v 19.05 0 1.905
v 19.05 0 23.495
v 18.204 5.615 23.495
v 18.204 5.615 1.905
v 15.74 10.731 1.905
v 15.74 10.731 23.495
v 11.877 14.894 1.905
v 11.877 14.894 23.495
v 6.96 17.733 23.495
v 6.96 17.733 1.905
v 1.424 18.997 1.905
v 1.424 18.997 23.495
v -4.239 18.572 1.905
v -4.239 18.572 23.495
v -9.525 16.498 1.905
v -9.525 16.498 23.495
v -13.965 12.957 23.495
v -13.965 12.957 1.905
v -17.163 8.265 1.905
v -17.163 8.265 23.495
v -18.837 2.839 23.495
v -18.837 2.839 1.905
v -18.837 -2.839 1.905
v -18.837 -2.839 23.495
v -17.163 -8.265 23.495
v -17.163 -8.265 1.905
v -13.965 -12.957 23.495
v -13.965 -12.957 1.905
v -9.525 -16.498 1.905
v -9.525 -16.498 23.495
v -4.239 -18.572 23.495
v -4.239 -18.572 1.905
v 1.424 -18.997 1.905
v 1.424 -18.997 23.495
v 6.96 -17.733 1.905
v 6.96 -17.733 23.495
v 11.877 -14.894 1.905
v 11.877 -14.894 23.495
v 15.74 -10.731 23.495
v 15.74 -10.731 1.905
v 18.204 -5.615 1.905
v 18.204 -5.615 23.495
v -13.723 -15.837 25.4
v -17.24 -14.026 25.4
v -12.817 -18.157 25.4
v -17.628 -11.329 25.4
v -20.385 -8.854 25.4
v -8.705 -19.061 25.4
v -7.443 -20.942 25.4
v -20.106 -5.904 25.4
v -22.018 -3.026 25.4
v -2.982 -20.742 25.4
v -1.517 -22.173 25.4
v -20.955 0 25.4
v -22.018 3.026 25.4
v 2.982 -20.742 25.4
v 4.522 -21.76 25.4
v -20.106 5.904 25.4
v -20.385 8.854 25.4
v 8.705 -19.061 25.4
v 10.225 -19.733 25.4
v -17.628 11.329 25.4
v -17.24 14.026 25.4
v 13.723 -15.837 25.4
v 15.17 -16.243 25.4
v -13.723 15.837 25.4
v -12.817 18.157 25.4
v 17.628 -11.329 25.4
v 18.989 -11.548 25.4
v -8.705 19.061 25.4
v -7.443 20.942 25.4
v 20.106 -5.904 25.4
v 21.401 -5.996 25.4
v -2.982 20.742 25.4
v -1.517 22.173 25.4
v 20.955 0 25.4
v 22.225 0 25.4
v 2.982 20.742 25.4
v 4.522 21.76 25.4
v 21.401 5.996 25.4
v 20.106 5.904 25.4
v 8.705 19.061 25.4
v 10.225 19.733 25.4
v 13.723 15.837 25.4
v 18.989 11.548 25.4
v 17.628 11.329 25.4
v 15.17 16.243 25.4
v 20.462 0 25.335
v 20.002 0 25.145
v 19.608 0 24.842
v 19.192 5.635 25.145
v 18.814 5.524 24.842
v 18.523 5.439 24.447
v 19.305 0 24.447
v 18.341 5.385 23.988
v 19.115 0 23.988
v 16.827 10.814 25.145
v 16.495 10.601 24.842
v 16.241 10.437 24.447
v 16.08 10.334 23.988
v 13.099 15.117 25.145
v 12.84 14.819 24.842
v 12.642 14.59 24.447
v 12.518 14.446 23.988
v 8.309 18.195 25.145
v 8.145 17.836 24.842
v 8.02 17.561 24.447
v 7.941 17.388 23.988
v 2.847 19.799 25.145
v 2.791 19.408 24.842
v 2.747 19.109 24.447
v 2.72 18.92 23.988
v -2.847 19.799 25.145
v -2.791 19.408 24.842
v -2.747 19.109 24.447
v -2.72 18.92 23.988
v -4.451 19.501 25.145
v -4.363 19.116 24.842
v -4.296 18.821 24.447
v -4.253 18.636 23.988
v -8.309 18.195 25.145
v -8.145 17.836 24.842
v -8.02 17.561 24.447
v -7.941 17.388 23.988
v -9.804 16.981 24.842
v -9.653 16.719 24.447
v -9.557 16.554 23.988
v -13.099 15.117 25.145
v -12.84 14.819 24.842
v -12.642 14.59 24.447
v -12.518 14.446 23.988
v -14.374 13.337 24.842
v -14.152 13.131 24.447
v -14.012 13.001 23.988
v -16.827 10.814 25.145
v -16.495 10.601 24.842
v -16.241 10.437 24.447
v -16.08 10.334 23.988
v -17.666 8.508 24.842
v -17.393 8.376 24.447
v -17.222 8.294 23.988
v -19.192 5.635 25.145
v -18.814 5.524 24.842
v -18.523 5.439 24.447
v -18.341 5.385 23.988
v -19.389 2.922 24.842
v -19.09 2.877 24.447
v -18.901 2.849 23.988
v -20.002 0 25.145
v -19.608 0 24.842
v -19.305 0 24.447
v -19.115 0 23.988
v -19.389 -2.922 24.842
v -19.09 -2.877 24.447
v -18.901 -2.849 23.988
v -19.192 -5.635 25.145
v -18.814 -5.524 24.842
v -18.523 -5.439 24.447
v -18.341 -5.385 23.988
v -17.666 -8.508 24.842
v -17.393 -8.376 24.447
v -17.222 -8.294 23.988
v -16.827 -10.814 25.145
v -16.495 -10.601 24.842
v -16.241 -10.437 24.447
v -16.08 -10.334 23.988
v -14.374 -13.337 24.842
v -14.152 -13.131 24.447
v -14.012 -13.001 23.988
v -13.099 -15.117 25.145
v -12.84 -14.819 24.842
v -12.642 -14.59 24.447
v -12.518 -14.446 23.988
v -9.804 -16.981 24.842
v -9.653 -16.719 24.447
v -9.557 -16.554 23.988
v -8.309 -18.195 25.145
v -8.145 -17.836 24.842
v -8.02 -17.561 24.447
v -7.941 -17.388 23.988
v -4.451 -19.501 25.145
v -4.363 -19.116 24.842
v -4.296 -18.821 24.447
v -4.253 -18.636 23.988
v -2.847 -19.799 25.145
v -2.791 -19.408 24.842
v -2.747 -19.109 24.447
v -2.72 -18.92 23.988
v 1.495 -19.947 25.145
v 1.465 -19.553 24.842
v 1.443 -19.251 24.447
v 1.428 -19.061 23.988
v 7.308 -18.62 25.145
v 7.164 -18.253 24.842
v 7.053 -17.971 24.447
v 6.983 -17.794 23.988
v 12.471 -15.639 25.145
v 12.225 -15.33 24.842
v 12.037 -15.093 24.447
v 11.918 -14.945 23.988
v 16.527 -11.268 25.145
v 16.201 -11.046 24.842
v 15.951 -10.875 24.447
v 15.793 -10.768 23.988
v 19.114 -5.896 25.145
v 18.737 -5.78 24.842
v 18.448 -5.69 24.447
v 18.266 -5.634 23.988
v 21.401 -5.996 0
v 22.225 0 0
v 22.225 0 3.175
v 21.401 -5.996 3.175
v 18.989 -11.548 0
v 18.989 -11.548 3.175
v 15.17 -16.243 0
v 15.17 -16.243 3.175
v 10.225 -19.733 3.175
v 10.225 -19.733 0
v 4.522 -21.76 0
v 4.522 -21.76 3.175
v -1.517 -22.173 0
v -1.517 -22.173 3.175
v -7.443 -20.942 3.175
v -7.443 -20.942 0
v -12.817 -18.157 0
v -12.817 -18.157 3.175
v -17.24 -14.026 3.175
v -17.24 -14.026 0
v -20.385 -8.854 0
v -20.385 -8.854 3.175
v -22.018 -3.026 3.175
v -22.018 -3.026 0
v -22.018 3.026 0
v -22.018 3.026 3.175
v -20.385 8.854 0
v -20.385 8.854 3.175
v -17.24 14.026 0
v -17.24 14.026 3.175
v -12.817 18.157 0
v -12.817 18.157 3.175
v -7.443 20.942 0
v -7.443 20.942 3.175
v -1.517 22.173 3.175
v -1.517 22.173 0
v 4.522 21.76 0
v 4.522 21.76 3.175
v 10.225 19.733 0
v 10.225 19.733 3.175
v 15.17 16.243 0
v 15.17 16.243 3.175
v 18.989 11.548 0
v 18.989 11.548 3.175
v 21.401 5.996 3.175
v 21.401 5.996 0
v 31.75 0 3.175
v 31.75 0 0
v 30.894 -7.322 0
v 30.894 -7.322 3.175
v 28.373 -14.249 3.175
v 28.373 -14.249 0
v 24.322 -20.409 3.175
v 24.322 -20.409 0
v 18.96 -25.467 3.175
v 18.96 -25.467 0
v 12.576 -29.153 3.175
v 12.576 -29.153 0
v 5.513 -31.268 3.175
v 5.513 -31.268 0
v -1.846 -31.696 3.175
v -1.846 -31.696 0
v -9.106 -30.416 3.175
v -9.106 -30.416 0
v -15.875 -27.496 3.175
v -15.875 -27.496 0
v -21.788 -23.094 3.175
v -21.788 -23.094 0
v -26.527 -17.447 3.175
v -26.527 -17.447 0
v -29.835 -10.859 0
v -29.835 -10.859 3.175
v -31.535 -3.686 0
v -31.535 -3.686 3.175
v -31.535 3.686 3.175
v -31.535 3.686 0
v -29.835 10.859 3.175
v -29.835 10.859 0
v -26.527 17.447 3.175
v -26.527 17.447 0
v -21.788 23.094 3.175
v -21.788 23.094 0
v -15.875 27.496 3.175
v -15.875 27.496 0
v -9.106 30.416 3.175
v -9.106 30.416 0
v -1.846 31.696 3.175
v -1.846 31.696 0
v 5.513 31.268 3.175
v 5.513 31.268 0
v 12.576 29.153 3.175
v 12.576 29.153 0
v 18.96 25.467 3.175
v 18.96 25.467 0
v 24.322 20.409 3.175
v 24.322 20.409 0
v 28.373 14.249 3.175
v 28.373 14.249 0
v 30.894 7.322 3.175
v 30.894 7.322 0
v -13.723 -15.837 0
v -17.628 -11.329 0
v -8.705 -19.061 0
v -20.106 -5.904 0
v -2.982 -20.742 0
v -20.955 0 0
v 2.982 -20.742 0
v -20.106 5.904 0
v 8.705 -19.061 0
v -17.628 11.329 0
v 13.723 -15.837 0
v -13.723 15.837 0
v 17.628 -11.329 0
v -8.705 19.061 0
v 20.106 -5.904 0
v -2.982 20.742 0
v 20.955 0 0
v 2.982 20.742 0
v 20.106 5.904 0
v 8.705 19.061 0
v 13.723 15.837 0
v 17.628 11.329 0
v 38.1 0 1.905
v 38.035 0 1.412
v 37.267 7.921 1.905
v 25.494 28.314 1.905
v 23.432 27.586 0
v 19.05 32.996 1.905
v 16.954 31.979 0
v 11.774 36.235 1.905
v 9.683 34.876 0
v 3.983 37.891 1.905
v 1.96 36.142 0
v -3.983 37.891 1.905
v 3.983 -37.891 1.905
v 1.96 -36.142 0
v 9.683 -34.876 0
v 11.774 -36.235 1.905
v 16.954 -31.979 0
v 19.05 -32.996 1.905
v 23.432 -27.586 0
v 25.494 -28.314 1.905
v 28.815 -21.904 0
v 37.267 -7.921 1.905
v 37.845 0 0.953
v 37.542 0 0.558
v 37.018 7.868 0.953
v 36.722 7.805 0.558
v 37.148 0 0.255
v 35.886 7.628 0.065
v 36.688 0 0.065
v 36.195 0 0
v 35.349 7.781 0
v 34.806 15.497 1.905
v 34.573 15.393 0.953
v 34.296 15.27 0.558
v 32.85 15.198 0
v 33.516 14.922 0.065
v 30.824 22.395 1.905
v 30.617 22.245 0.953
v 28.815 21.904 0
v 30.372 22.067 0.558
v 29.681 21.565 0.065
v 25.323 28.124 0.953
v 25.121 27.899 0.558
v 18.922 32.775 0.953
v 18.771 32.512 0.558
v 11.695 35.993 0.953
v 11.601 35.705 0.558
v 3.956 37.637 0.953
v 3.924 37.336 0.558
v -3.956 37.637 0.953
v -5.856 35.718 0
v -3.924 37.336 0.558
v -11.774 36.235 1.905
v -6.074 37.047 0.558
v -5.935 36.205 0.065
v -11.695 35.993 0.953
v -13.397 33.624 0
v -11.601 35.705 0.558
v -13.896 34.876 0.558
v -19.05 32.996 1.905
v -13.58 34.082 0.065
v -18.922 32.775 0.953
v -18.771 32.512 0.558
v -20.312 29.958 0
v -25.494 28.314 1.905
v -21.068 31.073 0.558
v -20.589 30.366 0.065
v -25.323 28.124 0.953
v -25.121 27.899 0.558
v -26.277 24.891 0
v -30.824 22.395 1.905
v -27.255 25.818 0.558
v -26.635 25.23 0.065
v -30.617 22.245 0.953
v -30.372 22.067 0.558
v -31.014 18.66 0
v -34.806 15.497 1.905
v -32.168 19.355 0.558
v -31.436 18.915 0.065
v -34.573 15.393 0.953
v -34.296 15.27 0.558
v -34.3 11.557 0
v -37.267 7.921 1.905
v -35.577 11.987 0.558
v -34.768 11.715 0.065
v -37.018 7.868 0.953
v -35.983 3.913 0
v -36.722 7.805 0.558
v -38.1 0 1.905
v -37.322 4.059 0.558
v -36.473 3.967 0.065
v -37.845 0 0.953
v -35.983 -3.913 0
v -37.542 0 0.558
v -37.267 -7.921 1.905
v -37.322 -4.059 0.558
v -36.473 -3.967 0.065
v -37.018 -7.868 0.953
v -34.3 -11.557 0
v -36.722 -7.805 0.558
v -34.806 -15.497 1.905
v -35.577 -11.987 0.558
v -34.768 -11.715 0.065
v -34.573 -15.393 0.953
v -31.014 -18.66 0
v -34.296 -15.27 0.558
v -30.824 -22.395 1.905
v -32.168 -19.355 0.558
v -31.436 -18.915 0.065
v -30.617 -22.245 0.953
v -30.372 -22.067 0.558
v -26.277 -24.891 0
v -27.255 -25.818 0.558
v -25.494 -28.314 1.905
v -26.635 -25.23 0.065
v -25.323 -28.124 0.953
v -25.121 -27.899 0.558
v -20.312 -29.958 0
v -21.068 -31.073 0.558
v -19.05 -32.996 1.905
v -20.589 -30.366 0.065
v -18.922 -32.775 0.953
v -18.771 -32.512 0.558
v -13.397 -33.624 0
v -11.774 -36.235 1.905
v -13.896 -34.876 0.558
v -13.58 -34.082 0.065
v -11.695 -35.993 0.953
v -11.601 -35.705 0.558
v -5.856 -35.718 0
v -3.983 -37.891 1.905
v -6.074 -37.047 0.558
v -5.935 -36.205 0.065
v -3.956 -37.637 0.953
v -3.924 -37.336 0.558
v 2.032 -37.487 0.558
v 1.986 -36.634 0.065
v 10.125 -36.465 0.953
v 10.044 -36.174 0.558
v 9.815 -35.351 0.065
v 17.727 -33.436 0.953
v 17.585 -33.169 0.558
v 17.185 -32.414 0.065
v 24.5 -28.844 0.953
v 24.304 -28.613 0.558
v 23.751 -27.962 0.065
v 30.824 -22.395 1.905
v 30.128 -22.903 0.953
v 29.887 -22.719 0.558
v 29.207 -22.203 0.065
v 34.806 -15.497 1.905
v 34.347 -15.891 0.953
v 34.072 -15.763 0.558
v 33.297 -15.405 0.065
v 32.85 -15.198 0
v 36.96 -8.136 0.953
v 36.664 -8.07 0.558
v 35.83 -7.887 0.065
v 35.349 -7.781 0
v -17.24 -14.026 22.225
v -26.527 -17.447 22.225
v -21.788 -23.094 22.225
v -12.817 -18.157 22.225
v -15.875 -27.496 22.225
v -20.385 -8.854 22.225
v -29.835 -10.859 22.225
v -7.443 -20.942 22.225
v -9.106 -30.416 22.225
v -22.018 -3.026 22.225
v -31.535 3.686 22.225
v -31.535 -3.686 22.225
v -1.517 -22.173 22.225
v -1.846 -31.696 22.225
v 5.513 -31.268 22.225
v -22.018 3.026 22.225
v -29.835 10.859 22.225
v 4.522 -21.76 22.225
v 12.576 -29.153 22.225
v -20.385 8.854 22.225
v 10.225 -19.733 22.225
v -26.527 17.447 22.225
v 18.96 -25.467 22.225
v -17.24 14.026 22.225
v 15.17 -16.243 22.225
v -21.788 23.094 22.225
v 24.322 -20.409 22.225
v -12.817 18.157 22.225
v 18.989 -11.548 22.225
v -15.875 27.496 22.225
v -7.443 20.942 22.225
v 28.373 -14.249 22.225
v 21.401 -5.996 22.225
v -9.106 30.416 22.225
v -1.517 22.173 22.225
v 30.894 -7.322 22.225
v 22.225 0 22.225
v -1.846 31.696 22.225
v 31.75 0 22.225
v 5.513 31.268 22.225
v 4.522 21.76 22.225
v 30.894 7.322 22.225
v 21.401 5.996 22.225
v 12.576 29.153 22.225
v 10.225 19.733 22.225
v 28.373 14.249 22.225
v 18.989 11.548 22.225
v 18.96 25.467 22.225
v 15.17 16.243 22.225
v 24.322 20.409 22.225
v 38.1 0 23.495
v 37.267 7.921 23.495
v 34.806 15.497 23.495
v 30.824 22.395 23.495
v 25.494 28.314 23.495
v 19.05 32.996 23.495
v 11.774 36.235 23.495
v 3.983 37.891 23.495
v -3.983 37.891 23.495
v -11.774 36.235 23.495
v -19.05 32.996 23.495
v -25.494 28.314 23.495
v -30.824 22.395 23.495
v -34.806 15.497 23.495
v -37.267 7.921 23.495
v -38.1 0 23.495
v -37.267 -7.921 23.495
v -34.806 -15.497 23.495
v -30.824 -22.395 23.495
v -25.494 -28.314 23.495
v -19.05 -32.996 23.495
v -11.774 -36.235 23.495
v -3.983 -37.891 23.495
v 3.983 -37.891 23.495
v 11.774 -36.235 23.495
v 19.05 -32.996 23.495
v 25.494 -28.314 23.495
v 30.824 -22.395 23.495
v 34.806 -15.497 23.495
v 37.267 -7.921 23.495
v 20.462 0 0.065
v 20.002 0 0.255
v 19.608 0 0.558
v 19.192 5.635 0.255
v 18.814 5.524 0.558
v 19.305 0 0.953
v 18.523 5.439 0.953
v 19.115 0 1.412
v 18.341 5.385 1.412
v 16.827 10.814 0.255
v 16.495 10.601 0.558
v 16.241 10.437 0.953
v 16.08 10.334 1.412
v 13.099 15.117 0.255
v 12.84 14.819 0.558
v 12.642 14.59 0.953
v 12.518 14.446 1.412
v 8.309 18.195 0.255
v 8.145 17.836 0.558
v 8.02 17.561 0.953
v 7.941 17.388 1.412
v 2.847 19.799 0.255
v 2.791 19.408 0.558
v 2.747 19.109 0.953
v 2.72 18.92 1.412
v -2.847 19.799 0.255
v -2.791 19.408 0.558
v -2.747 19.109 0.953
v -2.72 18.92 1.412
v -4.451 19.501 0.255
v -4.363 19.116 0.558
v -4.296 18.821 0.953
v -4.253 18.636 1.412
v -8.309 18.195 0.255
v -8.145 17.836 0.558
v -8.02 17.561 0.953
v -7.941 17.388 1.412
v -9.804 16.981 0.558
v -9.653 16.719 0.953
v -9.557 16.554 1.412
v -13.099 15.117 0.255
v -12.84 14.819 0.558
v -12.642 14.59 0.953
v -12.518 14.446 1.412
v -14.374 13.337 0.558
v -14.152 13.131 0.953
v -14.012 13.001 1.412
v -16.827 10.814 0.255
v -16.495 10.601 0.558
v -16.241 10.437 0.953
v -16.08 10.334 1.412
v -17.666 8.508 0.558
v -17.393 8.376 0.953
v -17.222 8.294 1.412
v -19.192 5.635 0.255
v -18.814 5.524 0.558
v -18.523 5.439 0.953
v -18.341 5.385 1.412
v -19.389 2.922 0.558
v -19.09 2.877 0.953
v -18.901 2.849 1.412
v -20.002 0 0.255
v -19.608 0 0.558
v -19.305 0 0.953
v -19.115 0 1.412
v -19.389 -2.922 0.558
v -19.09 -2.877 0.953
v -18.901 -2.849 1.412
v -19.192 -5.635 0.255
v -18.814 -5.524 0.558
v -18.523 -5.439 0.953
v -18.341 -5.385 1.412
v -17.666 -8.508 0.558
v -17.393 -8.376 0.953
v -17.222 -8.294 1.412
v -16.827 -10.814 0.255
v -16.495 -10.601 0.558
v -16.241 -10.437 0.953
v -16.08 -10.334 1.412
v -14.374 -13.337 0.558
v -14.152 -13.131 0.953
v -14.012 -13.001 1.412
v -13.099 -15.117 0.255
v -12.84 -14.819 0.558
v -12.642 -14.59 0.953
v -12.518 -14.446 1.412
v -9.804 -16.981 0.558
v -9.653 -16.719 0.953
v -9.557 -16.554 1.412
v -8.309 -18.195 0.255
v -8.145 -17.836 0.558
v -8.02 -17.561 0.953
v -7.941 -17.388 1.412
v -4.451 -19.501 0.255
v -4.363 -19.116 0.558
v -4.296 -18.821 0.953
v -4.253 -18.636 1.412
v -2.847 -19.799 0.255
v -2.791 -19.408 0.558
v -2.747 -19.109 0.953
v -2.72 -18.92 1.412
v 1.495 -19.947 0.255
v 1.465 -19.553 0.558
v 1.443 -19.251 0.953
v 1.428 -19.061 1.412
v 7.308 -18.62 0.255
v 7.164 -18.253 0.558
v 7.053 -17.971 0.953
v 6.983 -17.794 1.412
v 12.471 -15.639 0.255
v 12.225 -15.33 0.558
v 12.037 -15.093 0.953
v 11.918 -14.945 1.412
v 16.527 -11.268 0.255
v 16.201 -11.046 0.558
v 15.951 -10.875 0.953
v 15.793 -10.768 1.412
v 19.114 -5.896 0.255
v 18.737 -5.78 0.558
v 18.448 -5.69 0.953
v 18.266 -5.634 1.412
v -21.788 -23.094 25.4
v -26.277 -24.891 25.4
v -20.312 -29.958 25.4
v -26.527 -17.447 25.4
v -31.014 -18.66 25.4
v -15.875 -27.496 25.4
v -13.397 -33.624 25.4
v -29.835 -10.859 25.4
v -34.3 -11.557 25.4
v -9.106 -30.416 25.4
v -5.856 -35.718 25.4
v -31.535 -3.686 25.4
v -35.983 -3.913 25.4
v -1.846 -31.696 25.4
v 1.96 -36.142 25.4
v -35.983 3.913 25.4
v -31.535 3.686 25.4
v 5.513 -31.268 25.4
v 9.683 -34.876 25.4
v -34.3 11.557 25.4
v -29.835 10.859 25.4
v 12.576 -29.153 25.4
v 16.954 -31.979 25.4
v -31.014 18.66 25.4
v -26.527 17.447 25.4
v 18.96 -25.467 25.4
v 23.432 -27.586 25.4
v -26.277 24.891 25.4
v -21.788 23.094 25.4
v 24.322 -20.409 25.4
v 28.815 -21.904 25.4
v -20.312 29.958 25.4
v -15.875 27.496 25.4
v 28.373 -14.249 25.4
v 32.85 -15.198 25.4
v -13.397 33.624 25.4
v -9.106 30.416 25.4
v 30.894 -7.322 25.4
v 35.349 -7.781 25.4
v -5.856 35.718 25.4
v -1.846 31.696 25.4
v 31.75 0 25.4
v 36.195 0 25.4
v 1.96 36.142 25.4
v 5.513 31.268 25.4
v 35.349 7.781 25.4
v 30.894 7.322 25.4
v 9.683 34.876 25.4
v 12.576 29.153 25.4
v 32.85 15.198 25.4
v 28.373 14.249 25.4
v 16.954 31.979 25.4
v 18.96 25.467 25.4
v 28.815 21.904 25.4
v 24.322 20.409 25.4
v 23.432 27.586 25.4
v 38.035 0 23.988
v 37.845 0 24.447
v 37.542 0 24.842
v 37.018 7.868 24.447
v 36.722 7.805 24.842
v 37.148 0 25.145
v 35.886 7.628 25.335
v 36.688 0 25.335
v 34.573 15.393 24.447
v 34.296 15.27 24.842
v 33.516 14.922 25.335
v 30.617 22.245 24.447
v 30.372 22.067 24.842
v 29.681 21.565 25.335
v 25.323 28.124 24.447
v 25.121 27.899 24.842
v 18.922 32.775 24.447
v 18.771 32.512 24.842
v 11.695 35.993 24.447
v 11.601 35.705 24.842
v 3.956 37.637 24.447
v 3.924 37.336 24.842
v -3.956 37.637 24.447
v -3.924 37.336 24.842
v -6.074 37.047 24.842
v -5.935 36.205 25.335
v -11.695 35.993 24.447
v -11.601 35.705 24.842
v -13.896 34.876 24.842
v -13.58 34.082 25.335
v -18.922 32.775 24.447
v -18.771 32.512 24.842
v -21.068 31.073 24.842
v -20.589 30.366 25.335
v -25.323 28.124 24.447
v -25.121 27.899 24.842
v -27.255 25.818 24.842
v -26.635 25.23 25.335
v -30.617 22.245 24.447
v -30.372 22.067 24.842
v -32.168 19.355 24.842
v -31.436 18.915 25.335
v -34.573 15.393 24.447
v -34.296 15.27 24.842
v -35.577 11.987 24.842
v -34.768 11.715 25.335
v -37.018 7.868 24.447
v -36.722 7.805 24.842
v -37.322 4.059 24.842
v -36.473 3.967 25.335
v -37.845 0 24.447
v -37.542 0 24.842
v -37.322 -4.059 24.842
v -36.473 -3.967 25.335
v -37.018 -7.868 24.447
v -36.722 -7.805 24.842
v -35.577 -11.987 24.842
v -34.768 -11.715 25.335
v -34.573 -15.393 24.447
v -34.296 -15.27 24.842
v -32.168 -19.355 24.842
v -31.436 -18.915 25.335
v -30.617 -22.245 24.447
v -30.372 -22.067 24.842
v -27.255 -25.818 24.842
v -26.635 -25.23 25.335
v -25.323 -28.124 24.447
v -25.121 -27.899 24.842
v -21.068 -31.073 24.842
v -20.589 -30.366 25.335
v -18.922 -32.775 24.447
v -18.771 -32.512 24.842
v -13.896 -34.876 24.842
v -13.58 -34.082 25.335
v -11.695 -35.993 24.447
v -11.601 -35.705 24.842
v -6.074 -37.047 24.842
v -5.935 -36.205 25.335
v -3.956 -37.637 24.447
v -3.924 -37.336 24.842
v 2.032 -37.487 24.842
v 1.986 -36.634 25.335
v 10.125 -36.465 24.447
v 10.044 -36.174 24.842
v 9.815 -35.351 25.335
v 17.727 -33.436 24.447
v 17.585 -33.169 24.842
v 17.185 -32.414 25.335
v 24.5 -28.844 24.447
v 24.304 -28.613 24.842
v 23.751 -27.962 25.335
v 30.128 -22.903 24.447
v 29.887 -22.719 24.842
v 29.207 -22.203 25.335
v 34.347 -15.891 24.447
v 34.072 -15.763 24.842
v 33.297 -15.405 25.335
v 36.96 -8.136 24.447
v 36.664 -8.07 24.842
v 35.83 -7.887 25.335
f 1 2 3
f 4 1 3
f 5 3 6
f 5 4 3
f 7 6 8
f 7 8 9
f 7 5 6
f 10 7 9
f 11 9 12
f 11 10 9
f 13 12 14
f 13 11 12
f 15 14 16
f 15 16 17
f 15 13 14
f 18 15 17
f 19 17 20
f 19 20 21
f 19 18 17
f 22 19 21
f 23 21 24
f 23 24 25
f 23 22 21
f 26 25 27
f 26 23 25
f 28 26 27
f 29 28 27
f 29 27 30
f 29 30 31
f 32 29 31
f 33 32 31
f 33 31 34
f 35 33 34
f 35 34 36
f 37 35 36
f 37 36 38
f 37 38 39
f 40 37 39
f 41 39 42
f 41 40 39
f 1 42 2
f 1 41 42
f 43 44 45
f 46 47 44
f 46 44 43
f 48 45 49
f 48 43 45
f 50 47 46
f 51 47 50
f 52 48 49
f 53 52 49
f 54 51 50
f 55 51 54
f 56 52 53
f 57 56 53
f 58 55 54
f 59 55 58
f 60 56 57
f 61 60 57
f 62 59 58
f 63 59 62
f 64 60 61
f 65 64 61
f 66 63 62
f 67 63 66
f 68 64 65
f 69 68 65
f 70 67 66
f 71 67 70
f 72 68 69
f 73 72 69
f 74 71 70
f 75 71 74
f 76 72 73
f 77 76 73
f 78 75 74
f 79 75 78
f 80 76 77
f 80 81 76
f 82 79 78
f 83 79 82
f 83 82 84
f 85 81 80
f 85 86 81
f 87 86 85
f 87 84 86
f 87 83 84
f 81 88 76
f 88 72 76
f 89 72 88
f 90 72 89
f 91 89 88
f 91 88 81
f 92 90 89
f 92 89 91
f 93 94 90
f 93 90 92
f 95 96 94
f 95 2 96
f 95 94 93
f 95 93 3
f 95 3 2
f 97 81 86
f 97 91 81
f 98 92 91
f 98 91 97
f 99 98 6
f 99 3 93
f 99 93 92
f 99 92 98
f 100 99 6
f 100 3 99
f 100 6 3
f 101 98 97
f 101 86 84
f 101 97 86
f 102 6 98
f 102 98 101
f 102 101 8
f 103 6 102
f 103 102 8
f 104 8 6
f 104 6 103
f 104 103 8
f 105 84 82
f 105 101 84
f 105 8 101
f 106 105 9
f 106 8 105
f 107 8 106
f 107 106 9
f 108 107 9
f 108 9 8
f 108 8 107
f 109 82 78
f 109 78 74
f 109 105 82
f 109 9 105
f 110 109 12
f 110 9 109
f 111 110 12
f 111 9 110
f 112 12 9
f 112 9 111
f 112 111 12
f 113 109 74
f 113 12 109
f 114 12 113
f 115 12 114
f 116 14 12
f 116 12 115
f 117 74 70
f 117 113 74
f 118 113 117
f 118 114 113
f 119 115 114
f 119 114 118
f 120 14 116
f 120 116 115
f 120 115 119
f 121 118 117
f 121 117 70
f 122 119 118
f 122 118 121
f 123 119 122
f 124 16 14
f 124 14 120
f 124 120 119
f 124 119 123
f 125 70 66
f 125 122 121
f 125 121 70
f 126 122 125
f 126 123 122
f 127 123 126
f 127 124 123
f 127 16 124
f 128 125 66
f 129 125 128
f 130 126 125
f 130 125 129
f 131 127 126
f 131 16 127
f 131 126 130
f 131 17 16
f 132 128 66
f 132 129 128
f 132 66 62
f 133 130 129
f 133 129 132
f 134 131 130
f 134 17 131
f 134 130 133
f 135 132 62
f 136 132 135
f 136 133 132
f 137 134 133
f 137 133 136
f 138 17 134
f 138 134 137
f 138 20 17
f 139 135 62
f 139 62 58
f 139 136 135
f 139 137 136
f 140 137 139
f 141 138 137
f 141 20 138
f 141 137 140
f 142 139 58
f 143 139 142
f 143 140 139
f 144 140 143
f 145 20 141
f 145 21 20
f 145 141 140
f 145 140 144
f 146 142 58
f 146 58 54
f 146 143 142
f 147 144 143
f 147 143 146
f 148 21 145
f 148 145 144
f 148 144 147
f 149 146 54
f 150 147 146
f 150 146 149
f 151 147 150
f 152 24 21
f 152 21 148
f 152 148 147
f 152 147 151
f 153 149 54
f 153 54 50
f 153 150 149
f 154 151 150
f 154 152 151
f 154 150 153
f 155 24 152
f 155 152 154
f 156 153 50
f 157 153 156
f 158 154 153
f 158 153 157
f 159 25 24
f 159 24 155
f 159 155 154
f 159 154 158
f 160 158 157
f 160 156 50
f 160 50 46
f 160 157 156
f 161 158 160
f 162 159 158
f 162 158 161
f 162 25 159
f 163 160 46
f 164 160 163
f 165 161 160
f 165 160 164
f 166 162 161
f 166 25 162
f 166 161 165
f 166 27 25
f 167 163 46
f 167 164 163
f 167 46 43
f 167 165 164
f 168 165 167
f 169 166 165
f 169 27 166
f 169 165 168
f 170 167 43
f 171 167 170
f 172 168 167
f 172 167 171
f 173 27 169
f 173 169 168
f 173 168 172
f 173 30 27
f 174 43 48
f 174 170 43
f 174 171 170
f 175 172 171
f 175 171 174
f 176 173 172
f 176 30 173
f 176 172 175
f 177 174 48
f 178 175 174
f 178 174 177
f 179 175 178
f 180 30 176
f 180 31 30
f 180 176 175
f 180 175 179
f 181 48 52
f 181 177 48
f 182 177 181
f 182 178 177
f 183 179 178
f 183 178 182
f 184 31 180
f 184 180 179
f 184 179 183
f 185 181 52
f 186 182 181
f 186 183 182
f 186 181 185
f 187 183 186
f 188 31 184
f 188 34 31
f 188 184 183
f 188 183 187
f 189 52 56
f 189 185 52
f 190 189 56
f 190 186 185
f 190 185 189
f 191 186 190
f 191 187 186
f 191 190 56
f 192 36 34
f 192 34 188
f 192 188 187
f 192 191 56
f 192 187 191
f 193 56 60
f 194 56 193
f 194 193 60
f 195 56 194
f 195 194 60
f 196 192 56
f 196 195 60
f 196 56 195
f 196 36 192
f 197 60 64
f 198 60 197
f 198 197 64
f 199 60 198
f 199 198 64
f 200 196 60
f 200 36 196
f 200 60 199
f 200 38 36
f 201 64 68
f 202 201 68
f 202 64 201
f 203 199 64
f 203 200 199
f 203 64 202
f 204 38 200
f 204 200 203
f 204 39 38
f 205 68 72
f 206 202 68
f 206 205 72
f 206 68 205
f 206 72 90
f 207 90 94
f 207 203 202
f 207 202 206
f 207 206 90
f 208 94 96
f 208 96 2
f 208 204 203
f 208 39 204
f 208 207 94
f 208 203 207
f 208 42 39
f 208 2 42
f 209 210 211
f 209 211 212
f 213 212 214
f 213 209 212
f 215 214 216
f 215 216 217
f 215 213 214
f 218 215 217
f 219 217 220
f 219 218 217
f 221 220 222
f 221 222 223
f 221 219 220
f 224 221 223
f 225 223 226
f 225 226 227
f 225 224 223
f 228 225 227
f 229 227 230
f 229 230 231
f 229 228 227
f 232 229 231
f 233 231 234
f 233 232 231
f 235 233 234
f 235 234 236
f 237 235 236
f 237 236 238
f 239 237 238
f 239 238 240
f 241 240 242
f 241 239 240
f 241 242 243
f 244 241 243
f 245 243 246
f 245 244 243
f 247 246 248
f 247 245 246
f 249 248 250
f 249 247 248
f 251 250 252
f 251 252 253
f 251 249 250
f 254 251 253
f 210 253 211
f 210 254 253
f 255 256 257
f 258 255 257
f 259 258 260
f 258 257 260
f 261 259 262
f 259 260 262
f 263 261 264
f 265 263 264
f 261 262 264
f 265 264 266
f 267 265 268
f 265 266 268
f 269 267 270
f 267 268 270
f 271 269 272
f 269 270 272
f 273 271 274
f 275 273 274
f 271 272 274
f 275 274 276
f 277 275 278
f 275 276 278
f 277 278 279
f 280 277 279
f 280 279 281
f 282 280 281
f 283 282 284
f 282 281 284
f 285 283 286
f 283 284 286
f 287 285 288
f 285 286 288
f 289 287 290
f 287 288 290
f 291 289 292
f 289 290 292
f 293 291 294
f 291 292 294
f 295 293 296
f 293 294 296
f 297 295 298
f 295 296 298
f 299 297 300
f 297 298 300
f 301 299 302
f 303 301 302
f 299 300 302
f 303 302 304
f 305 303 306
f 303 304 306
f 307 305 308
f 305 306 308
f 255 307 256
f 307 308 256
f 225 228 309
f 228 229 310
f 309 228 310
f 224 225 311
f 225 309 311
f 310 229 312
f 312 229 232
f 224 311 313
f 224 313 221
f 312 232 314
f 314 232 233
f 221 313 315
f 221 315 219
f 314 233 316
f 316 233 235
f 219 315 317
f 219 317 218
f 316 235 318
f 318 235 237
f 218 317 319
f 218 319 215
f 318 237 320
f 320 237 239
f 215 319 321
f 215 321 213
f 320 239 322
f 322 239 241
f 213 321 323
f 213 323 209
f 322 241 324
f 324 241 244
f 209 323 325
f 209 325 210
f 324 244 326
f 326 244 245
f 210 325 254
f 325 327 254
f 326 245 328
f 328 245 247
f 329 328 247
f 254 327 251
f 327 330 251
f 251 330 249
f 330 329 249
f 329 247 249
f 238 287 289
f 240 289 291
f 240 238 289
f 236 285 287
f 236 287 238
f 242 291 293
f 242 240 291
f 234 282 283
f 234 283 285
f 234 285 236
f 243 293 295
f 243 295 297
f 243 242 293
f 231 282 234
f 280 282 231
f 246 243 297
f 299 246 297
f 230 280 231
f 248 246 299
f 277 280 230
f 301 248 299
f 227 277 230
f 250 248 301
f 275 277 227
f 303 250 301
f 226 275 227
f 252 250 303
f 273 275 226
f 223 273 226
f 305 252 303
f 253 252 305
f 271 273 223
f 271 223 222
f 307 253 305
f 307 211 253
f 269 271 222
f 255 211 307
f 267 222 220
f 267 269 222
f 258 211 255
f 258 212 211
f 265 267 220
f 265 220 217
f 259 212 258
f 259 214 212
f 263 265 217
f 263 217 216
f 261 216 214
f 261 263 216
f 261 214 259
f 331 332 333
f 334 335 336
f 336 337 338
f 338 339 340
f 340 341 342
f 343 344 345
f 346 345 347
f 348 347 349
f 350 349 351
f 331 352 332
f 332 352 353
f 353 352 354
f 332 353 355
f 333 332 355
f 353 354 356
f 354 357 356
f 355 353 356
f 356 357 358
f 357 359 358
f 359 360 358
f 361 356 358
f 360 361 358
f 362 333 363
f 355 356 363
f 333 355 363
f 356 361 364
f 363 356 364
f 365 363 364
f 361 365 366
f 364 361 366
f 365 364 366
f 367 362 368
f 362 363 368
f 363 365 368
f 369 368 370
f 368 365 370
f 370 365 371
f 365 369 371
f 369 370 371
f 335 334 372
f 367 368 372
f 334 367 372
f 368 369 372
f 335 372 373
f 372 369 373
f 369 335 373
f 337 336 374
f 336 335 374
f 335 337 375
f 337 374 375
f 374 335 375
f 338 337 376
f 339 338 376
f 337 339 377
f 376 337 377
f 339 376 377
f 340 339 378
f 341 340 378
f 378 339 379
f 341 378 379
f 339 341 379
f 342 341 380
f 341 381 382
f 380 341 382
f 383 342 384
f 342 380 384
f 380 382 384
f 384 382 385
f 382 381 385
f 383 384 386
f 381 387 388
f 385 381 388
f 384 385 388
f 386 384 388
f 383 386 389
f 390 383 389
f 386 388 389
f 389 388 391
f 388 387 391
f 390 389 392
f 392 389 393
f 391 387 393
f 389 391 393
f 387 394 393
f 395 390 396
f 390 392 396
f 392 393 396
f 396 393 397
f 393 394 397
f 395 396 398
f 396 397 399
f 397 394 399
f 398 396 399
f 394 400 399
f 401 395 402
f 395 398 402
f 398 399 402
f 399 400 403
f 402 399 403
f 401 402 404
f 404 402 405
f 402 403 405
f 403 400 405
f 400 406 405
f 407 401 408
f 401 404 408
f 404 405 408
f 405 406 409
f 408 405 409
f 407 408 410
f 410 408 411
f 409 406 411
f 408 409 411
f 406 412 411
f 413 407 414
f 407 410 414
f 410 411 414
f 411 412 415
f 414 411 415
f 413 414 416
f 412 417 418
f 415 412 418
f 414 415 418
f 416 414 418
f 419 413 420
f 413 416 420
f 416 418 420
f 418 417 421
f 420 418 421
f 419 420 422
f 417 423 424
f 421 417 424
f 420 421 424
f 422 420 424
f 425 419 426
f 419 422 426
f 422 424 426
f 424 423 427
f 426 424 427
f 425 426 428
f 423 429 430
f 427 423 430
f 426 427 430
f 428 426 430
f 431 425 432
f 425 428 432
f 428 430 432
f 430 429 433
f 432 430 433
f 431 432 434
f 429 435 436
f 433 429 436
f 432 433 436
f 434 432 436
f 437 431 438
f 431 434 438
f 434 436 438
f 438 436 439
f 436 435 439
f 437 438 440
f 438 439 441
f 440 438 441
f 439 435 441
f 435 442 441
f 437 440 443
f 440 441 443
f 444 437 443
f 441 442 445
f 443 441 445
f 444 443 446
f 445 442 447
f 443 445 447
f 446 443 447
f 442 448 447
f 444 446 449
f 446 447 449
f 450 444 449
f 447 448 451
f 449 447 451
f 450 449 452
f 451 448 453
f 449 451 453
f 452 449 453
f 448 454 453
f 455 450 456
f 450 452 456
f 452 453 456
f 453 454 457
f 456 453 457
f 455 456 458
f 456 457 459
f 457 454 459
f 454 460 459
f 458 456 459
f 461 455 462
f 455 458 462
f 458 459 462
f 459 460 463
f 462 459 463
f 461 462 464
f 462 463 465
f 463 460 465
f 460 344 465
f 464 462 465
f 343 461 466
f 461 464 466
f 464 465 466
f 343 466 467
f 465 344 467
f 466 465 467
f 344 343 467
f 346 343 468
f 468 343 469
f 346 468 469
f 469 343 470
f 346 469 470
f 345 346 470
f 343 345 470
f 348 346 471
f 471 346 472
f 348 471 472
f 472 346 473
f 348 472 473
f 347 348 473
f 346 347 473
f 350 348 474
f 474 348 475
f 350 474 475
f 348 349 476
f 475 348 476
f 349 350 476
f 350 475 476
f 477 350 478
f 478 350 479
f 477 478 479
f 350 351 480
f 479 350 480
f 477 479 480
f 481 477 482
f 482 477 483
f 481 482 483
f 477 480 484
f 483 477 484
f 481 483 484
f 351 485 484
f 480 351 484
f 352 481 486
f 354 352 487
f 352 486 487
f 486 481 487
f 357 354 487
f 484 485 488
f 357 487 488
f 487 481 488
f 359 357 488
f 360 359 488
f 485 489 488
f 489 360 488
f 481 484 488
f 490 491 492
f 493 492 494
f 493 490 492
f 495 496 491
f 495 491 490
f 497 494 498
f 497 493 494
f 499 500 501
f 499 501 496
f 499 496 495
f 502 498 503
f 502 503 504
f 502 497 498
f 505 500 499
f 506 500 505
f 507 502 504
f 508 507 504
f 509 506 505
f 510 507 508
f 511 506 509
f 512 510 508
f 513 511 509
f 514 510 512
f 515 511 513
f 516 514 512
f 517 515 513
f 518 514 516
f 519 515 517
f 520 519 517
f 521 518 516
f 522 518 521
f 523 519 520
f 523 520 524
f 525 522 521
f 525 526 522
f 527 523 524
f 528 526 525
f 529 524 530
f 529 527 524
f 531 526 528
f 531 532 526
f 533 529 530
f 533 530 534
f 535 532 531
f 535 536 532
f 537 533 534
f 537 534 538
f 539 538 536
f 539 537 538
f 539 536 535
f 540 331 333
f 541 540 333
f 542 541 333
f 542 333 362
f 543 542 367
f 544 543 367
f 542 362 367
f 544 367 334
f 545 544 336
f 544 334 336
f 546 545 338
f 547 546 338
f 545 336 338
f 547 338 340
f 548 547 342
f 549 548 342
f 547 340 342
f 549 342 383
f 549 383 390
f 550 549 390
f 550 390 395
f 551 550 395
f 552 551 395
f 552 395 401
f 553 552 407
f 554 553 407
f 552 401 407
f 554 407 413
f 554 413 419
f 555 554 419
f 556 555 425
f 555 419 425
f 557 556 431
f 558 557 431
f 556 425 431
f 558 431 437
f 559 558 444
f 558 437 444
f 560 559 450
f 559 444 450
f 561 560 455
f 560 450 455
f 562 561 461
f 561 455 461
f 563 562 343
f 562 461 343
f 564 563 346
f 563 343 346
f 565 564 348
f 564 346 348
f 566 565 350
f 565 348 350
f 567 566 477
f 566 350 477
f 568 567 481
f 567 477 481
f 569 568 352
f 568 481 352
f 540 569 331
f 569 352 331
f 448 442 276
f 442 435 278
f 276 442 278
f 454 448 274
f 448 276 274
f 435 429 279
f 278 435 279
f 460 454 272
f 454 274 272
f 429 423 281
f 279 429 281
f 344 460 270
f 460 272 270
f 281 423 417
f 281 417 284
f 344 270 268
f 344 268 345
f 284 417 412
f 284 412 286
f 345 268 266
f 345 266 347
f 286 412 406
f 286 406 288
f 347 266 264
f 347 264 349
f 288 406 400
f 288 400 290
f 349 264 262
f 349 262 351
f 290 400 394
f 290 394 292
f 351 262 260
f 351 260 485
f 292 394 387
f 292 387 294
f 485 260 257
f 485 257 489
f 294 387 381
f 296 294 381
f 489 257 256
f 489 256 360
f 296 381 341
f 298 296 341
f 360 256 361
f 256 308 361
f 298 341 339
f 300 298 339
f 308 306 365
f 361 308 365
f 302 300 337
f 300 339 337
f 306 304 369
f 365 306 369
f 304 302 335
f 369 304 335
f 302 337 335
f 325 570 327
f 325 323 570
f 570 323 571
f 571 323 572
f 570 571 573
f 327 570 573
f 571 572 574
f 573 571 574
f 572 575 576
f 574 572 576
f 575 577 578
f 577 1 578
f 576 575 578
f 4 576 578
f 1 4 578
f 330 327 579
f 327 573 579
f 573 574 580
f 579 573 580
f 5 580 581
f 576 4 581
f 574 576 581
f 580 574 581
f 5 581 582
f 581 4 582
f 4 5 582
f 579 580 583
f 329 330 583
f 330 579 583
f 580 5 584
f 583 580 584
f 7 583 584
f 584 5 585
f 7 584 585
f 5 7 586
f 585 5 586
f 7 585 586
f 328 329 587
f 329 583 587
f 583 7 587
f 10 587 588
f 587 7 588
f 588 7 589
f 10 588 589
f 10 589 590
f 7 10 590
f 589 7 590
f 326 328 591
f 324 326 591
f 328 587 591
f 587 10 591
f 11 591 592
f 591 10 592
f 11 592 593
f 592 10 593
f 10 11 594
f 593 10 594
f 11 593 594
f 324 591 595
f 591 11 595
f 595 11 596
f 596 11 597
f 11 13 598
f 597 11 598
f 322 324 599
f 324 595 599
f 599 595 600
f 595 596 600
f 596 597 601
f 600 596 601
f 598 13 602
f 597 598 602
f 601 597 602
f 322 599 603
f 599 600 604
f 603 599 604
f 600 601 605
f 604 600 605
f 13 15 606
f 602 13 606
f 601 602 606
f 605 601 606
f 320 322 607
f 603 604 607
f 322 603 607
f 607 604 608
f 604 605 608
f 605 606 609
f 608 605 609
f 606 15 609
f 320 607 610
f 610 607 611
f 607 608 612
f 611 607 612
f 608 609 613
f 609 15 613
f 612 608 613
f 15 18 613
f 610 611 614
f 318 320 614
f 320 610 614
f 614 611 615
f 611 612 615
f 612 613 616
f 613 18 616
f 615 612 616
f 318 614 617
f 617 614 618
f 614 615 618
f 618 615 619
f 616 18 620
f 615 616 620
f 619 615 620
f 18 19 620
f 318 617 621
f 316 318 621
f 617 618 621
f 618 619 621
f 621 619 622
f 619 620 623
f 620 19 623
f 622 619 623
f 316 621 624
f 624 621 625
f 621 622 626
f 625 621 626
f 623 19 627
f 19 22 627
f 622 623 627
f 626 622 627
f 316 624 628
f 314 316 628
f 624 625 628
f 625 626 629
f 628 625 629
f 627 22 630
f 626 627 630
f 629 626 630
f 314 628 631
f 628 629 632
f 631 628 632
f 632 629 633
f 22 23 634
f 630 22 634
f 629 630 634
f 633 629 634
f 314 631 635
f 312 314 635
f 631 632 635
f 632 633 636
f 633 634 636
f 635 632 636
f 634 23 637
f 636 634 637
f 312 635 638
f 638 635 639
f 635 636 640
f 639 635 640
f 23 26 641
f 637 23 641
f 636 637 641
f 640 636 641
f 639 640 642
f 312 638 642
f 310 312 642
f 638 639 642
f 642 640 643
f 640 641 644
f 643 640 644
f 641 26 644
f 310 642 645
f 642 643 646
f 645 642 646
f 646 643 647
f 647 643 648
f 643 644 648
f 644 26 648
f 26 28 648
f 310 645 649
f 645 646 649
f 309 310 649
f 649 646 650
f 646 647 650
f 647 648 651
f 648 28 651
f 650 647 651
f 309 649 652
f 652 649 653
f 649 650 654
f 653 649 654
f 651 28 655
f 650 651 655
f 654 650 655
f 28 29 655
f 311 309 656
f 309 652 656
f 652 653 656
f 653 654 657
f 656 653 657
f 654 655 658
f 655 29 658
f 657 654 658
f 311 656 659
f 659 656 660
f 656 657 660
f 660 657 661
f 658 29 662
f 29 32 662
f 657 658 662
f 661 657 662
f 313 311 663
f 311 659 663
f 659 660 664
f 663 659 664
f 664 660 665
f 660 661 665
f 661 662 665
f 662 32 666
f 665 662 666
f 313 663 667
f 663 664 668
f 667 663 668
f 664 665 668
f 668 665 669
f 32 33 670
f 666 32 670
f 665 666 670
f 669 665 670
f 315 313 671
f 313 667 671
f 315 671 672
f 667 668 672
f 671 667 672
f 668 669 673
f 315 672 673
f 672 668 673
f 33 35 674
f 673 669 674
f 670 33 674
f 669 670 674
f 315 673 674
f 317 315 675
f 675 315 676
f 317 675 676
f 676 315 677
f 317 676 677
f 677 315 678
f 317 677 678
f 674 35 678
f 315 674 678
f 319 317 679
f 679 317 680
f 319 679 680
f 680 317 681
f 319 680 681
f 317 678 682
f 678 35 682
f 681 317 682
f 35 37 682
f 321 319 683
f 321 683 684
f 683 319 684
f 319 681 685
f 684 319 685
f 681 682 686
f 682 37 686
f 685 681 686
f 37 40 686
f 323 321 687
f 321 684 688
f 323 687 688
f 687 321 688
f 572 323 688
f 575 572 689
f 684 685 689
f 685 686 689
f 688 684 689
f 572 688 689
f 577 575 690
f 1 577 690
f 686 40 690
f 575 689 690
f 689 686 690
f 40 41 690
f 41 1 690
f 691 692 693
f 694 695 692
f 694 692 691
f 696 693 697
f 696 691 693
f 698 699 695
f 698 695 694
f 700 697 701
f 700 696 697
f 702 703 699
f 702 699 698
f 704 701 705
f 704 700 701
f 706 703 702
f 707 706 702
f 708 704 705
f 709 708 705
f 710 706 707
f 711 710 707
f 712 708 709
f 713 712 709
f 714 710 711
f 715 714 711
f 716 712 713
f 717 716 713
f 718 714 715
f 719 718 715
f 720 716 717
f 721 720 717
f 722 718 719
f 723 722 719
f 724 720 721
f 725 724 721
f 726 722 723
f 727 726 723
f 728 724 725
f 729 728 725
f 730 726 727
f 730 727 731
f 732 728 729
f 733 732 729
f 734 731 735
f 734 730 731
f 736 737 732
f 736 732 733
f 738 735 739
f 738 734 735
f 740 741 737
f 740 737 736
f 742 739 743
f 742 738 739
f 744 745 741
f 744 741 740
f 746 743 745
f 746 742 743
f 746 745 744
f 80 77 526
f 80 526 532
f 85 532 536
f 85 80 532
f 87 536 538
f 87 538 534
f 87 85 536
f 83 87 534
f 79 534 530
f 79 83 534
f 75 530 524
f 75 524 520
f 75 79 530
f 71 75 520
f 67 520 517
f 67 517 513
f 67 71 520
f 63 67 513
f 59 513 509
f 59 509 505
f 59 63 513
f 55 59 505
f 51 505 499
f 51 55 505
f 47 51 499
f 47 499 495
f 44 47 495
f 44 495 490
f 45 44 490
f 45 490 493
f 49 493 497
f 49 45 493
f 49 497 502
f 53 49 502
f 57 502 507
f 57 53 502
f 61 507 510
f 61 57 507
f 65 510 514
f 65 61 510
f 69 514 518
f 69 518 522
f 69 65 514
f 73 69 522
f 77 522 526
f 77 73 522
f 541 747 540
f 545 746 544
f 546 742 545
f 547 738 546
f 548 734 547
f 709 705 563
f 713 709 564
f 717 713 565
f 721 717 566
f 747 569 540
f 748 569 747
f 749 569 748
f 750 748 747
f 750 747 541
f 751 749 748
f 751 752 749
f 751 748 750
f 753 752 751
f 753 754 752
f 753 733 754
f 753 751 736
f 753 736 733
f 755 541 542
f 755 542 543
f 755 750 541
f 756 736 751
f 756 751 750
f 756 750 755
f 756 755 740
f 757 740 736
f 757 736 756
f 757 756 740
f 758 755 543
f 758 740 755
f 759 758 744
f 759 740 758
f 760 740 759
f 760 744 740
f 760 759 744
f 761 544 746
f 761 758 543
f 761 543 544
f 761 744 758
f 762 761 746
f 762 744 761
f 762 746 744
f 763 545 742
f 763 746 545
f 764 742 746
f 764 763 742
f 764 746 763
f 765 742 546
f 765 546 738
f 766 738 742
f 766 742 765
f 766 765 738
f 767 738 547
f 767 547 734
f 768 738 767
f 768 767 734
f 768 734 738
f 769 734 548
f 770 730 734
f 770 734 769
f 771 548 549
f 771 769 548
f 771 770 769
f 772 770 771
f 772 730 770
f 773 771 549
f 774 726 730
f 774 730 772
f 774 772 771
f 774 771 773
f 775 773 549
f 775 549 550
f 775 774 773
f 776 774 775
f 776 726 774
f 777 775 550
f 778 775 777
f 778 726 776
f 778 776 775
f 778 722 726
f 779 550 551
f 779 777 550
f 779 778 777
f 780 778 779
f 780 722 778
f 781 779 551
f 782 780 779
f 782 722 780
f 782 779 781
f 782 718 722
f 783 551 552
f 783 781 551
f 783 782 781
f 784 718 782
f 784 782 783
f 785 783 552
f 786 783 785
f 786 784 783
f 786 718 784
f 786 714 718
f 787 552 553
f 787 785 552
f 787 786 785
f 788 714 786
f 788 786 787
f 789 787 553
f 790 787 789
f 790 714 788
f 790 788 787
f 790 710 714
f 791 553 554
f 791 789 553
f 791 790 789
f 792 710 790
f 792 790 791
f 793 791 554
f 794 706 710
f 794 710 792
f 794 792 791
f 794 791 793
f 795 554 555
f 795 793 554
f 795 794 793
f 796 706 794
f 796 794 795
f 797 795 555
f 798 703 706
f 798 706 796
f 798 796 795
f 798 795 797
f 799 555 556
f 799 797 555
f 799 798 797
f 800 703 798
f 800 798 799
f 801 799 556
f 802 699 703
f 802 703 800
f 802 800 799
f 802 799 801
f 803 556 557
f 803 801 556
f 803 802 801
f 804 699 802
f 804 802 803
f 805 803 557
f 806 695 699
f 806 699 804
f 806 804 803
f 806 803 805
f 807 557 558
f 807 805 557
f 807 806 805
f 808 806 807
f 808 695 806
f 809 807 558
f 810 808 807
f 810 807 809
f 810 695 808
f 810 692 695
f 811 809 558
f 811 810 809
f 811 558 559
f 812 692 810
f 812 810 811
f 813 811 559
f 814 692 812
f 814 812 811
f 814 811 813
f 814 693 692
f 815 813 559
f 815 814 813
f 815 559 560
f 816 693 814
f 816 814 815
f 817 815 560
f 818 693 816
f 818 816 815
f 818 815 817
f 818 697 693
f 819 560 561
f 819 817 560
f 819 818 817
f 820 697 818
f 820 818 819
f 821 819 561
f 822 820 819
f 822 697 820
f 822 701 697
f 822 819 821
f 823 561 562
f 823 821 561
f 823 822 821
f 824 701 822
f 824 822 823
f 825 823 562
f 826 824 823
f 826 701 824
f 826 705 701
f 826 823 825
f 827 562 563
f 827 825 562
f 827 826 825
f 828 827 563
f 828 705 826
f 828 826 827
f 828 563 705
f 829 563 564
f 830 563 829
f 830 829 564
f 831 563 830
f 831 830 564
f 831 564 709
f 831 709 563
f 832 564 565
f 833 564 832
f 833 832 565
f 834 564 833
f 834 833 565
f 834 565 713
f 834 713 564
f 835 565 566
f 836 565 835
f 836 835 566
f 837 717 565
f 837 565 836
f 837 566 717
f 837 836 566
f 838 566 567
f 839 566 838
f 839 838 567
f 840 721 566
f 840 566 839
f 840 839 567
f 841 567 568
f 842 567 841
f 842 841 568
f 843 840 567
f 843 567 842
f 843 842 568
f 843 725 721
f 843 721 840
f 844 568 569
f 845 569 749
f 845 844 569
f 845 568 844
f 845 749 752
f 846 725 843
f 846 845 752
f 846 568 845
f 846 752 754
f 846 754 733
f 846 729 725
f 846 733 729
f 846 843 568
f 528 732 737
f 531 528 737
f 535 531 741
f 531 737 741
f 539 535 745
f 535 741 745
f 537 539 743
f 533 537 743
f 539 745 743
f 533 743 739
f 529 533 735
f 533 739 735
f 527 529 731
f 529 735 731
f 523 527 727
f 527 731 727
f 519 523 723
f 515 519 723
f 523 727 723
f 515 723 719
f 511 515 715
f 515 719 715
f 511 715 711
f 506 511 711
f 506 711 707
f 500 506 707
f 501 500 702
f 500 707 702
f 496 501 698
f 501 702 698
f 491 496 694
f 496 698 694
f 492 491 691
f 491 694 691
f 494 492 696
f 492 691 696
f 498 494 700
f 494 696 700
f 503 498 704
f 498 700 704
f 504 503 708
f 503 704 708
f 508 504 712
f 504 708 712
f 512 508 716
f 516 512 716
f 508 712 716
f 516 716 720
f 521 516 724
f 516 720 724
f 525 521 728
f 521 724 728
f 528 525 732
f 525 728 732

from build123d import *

# Parameters (mm, degrees)
F0_R     = 38.1
F0_R_2   = 19.05
F1_DEPTH = 25.4
F2_R     = 31.75
F2_R_2   = 22.225
F3_DEPTH = 3.175
F4_R     = 31.75
F4_R_2   = 22.225
F5_DEPTH = 3.175
F6_R     = 1.905


with BuildPart() as f1:
    # F0 (on Top) → F1 (new body)
    with BuildSketch(Plane.XY):
        Circle(F0_R)
        Circle(F0_R_2, mode=Mode.SUBTRACT)
    extrude(amount=F1_DEPTH)

    # F2 (on face) → F3 (cut)
    with BuildSketch(Plane(origin=(0, 0, 0), x_dir=(1, 0, 0), z_dir=(0, 0, -1))):
        Circle(F2_R)
        Circle(F2_R_2, mode=Mode.SUBTRACT)
    extrude(amount=-F3_DEPTH, mode=Mode.SUBTRACT)

    # F4 (on face) → F5 (cut)
    with BuildSketch(Plane.XY.offset(25.4)):
        Circle(F4_R)
        Circle(F4_R_2, mode=Mode.SUBTRACT)
    extrude(amount=-F5_DEPTH, mode=Mode.SUBTRACT)

    # F6
    f6_edges = [f1.edges().sort_by_distance(p)[0] for p in [
        (-38.1, 0, 0),
        (-38.1, 0, 25.4),
        (-19.05, 0, 0),
        (-19.05, 0, 25.4),
    ]]
    fillet(f6_edges, radius=F6_R)


solid = f1.part
